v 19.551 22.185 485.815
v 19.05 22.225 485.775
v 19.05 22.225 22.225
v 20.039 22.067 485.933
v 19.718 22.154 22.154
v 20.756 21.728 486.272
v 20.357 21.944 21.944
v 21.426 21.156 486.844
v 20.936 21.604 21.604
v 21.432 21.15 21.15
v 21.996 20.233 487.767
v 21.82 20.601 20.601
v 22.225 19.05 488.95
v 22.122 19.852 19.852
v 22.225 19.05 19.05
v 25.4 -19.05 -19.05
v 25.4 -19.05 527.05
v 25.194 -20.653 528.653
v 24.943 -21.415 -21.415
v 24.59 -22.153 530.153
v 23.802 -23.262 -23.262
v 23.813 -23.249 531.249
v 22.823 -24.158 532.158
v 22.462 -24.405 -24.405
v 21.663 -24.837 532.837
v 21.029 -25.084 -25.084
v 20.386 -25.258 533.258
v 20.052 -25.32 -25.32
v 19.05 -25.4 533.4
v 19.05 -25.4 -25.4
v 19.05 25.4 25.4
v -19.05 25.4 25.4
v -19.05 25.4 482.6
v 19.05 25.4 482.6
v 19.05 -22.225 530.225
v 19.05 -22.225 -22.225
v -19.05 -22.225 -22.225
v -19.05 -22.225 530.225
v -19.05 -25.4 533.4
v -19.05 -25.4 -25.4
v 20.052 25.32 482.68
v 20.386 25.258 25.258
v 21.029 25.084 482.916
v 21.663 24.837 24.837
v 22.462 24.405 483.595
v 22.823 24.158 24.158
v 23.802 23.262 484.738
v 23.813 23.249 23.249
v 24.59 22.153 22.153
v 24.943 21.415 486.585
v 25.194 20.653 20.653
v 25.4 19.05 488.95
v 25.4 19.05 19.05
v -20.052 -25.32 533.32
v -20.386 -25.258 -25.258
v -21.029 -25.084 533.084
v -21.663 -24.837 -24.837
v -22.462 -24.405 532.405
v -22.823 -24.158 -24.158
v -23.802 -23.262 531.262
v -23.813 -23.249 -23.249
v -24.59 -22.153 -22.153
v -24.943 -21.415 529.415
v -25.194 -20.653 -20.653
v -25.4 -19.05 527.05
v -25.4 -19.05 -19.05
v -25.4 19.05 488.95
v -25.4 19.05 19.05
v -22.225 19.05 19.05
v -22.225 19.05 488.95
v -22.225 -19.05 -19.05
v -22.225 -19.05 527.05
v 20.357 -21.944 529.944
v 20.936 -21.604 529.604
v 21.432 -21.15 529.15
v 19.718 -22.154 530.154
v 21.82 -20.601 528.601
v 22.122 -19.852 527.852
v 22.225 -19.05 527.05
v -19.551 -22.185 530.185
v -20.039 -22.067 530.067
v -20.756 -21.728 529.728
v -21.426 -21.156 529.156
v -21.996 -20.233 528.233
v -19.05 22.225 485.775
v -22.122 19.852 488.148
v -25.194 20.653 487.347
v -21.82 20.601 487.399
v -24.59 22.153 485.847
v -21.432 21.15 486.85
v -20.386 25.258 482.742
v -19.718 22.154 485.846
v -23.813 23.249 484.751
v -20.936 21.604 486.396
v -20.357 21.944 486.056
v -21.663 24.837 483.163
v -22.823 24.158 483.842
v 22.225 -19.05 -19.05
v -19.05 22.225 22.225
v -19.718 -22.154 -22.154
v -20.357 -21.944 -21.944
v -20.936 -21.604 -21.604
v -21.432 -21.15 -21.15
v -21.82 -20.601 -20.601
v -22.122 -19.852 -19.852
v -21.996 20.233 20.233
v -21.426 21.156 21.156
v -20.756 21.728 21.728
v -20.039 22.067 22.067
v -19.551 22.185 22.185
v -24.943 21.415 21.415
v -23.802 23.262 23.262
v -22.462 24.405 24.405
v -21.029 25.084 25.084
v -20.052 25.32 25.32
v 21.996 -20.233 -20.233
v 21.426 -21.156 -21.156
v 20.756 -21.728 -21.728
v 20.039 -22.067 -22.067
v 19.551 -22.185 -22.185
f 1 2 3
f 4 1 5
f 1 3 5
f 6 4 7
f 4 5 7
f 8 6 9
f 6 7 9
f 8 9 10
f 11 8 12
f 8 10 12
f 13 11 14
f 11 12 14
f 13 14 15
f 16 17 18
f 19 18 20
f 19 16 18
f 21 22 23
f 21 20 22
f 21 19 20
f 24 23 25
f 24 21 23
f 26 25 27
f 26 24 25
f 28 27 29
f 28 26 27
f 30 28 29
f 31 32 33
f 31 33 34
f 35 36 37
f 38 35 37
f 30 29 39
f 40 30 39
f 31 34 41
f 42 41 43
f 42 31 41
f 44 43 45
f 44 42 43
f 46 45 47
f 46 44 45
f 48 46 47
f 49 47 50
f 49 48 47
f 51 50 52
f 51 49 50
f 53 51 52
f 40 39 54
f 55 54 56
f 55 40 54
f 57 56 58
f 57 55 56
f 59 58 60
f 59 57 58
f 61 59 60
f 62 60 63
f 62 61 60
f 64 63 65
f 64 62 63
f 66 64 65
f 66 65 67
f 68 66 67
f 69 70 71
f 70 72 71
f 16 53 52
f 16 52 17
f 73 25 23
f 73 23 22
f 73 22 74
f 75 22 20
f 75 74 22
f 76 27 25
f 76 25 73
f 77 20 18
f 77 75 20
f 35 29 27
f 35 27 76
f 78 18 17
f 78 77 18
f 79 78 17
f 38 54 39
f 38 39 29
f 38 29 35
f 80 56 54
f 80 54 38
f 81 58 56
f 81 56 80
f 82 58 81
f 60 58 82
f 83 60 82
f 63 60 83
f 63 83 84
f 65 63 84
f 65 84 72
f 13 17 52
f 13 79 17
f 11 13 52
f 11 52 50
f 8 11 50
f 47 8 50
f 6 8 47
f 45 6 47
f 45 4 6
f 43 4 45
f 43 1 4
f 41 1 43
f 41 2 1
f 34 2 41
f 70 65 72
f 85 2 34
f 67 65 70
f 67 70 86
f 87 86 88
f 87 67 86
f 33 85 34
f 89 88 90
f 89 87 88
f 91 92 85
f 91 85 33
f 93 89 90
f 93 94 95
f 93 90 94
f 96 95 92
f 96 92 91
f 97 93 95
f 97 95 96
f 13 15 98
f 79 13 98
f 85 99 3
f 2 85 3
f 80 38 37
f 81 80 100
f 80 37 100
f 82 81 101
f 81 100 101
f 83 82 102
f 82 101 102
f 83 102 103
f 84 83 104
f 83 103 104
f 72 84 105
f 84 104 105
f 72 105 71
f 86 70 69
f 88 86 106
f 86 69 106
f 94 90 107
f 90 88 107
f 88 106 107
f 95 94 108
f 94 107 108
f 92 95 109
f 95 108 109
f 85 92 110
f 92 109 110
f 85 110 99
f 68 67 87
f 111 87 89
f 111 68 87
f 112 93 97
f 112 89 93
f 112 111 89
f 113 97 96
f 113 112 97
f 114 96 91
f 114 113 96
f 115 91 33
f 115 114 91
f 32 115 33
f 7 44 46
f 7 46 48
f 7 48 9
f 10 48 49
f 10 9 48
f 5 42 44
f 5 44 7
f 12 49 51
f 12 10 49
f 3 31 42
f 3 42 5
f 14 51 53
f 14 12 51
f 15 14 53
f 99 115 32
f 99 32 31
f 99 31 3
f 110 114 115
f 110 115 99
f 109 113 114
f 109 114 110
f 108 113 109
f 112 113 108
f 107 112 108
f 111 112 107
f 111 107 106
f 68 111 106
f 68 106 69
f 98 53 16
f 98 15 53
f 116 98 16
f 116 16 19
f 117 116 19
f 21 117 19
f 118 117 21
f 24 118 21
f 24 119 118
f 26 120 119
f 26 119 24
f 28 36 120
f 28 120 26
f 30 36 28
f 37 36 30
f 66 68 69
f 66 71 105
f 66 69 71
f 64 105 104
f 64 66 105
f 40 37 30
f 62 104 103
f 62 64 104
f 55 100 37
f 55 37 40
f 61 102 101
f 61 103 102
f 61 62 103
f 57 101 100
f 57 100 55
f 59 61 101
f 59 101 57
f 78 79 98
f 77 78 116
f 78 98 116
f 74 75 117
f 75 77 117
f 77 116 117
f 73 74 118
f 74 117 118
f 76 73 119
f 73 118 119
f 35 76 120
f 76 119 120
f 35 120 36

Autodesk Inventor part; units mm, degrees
ref_plane "Start Plane" through (0, 0, -25.4) normal (0, 0, 1) x (1, 0, 0)
ref_plane "End Plane" through (0, 0, 533.4) normal (0, 0, 1) x (1, 0, 0)
sketch "Sketch" plane through (0, 0, 0) normal (0, 0, 1) x (1, 0, 0)
  line L0 (-25.4, -19.05) -> (-25.4, 19.05)
  line L1 (-19.05, 25.4) -> (19.05, 25.4)
  line L2 (25.4, 19.05) -> (25.4, -19.05)
  line L3 (19.05, -25.4) -> (-19.05, -25.4)
  arc A0 (-25.4, -19.05) -> (-19.05, -25.4) centre (-19.05, -19.05) ccw
  arc A1 (-19.05, 25.4) -> (-25.4, 19.05) centre (-19.05, 19.05) ccw
  arc A2 (25.4, 19.05) -> (19.05, 25.4) centre (19.05, 19.05) ccw
  arc A3 (19.05, -25.4) -> (25.4, -19.05) centre (19.05, -19.05) ccw
  arc A4 (-19.05, 22.225) -> (-22.225, 19.05) centre (-19.05, 19.05) ccw
  line L4 (-19.05, 22.225) -> (19.05, 22.225)
  arc A5 (22.225, 19.05) -> (19.05, 22.225) centre (19.05, 19.05) ccw
  line L5 (22.225, 19.05) -> (22.225, -19.05)
  arc A6 (19.05, -22.225) -> (22.225, -19.05) centre (19.05, -19.05) ccw
  line L6 (19.05, -22.225) -> (-19.05, -22.225)
  arc A7 (-22.225, -19.05) -> (-19.05, -22.225) centre (-19.05, -19.05) ccw
  line L7 (-22.225, -19.05) -> (-22.225, 19.05)
  line L8 (0, 37.4012) -> (0, -37.4012) construction
  line L9 (-37.4012, 0) -> (37.4012, 0) construction
  dimension "d10" = 50.8
  dimension "d11" = 50.8
  dimension "d12" = 3.175
  dimension "d15" = 25.4
  dimension "d16" = 25.4
  dimension "d17" = 6.35
extrude "Body" add sketch "Sketch" along normal up to surface (558.8 mm away) from surface at -25.4
sketch "Sketch3" plane through (0, 0, 0) normal (0, 0, 1) x (1, 0, 0)
  line L0 (0, 0) -> (10, 0)
ref_plane "Work Plane3" through (0, 0, 0) normal (0, -1, 0) x (1, 0, 0)
sketch "Sketch4" plane through (0, 0, 0) normal (0, -1, 0) x (1, 0, 0)
  line L0 (-2, -25.4) -> (12, -25.4)
  line L1 (-2, 533.4) -> (12, 533.4)
  dimension "d19" = 558.8
ref_plane "Work Plane4" through (0, -25.4, -25.4) normal (0, 0.7071, -0.7071) x (1, 0, 0)
split "Split1" plane through (0, -25.4, -25.4) removes the side toward (0, 0.7071, -0.7071)
ref_plane "Work Plane5" through (0, -25.4, 533.4) normal (0, 0.7071, 0.7071) x (1, 0, 0)
split "Split2" plane through (0, -25.4, 533.4) removes the side toward (0, 0.7071, 0.7071)
equation "\"d10\" = G_H"
equation "\"d11\" = G_W"
equation "\"d12\" = G_T"
equation "\"d15\" = 0.5 * d10"
equation "\"d16\" = 0.5 * d11"
equation "\"d17\" = G_IR"
equation "\"d3\" = G_L"
equation "\"G_W\" = 50.8"
equation "\"G_H\" = 50.8"
equation "\"G_T\" = 3.175"
equation "\"G_IR\" = 6.35"
equation "\"G_L\" = d19"
equation "\"G_OFFSET_START\" = 25.4"
equation "\"G_OFFSET_END\" = 25.4"
equation "\"d13\" = -G_OFFSET_START"
equation "\"d14\" = G_OFFSET_END + B_L"
equation "\"B_L\" = 508"
properties part number "AISC - 2 x 2 x 1/8 - 22" material "Steel, Mild"
